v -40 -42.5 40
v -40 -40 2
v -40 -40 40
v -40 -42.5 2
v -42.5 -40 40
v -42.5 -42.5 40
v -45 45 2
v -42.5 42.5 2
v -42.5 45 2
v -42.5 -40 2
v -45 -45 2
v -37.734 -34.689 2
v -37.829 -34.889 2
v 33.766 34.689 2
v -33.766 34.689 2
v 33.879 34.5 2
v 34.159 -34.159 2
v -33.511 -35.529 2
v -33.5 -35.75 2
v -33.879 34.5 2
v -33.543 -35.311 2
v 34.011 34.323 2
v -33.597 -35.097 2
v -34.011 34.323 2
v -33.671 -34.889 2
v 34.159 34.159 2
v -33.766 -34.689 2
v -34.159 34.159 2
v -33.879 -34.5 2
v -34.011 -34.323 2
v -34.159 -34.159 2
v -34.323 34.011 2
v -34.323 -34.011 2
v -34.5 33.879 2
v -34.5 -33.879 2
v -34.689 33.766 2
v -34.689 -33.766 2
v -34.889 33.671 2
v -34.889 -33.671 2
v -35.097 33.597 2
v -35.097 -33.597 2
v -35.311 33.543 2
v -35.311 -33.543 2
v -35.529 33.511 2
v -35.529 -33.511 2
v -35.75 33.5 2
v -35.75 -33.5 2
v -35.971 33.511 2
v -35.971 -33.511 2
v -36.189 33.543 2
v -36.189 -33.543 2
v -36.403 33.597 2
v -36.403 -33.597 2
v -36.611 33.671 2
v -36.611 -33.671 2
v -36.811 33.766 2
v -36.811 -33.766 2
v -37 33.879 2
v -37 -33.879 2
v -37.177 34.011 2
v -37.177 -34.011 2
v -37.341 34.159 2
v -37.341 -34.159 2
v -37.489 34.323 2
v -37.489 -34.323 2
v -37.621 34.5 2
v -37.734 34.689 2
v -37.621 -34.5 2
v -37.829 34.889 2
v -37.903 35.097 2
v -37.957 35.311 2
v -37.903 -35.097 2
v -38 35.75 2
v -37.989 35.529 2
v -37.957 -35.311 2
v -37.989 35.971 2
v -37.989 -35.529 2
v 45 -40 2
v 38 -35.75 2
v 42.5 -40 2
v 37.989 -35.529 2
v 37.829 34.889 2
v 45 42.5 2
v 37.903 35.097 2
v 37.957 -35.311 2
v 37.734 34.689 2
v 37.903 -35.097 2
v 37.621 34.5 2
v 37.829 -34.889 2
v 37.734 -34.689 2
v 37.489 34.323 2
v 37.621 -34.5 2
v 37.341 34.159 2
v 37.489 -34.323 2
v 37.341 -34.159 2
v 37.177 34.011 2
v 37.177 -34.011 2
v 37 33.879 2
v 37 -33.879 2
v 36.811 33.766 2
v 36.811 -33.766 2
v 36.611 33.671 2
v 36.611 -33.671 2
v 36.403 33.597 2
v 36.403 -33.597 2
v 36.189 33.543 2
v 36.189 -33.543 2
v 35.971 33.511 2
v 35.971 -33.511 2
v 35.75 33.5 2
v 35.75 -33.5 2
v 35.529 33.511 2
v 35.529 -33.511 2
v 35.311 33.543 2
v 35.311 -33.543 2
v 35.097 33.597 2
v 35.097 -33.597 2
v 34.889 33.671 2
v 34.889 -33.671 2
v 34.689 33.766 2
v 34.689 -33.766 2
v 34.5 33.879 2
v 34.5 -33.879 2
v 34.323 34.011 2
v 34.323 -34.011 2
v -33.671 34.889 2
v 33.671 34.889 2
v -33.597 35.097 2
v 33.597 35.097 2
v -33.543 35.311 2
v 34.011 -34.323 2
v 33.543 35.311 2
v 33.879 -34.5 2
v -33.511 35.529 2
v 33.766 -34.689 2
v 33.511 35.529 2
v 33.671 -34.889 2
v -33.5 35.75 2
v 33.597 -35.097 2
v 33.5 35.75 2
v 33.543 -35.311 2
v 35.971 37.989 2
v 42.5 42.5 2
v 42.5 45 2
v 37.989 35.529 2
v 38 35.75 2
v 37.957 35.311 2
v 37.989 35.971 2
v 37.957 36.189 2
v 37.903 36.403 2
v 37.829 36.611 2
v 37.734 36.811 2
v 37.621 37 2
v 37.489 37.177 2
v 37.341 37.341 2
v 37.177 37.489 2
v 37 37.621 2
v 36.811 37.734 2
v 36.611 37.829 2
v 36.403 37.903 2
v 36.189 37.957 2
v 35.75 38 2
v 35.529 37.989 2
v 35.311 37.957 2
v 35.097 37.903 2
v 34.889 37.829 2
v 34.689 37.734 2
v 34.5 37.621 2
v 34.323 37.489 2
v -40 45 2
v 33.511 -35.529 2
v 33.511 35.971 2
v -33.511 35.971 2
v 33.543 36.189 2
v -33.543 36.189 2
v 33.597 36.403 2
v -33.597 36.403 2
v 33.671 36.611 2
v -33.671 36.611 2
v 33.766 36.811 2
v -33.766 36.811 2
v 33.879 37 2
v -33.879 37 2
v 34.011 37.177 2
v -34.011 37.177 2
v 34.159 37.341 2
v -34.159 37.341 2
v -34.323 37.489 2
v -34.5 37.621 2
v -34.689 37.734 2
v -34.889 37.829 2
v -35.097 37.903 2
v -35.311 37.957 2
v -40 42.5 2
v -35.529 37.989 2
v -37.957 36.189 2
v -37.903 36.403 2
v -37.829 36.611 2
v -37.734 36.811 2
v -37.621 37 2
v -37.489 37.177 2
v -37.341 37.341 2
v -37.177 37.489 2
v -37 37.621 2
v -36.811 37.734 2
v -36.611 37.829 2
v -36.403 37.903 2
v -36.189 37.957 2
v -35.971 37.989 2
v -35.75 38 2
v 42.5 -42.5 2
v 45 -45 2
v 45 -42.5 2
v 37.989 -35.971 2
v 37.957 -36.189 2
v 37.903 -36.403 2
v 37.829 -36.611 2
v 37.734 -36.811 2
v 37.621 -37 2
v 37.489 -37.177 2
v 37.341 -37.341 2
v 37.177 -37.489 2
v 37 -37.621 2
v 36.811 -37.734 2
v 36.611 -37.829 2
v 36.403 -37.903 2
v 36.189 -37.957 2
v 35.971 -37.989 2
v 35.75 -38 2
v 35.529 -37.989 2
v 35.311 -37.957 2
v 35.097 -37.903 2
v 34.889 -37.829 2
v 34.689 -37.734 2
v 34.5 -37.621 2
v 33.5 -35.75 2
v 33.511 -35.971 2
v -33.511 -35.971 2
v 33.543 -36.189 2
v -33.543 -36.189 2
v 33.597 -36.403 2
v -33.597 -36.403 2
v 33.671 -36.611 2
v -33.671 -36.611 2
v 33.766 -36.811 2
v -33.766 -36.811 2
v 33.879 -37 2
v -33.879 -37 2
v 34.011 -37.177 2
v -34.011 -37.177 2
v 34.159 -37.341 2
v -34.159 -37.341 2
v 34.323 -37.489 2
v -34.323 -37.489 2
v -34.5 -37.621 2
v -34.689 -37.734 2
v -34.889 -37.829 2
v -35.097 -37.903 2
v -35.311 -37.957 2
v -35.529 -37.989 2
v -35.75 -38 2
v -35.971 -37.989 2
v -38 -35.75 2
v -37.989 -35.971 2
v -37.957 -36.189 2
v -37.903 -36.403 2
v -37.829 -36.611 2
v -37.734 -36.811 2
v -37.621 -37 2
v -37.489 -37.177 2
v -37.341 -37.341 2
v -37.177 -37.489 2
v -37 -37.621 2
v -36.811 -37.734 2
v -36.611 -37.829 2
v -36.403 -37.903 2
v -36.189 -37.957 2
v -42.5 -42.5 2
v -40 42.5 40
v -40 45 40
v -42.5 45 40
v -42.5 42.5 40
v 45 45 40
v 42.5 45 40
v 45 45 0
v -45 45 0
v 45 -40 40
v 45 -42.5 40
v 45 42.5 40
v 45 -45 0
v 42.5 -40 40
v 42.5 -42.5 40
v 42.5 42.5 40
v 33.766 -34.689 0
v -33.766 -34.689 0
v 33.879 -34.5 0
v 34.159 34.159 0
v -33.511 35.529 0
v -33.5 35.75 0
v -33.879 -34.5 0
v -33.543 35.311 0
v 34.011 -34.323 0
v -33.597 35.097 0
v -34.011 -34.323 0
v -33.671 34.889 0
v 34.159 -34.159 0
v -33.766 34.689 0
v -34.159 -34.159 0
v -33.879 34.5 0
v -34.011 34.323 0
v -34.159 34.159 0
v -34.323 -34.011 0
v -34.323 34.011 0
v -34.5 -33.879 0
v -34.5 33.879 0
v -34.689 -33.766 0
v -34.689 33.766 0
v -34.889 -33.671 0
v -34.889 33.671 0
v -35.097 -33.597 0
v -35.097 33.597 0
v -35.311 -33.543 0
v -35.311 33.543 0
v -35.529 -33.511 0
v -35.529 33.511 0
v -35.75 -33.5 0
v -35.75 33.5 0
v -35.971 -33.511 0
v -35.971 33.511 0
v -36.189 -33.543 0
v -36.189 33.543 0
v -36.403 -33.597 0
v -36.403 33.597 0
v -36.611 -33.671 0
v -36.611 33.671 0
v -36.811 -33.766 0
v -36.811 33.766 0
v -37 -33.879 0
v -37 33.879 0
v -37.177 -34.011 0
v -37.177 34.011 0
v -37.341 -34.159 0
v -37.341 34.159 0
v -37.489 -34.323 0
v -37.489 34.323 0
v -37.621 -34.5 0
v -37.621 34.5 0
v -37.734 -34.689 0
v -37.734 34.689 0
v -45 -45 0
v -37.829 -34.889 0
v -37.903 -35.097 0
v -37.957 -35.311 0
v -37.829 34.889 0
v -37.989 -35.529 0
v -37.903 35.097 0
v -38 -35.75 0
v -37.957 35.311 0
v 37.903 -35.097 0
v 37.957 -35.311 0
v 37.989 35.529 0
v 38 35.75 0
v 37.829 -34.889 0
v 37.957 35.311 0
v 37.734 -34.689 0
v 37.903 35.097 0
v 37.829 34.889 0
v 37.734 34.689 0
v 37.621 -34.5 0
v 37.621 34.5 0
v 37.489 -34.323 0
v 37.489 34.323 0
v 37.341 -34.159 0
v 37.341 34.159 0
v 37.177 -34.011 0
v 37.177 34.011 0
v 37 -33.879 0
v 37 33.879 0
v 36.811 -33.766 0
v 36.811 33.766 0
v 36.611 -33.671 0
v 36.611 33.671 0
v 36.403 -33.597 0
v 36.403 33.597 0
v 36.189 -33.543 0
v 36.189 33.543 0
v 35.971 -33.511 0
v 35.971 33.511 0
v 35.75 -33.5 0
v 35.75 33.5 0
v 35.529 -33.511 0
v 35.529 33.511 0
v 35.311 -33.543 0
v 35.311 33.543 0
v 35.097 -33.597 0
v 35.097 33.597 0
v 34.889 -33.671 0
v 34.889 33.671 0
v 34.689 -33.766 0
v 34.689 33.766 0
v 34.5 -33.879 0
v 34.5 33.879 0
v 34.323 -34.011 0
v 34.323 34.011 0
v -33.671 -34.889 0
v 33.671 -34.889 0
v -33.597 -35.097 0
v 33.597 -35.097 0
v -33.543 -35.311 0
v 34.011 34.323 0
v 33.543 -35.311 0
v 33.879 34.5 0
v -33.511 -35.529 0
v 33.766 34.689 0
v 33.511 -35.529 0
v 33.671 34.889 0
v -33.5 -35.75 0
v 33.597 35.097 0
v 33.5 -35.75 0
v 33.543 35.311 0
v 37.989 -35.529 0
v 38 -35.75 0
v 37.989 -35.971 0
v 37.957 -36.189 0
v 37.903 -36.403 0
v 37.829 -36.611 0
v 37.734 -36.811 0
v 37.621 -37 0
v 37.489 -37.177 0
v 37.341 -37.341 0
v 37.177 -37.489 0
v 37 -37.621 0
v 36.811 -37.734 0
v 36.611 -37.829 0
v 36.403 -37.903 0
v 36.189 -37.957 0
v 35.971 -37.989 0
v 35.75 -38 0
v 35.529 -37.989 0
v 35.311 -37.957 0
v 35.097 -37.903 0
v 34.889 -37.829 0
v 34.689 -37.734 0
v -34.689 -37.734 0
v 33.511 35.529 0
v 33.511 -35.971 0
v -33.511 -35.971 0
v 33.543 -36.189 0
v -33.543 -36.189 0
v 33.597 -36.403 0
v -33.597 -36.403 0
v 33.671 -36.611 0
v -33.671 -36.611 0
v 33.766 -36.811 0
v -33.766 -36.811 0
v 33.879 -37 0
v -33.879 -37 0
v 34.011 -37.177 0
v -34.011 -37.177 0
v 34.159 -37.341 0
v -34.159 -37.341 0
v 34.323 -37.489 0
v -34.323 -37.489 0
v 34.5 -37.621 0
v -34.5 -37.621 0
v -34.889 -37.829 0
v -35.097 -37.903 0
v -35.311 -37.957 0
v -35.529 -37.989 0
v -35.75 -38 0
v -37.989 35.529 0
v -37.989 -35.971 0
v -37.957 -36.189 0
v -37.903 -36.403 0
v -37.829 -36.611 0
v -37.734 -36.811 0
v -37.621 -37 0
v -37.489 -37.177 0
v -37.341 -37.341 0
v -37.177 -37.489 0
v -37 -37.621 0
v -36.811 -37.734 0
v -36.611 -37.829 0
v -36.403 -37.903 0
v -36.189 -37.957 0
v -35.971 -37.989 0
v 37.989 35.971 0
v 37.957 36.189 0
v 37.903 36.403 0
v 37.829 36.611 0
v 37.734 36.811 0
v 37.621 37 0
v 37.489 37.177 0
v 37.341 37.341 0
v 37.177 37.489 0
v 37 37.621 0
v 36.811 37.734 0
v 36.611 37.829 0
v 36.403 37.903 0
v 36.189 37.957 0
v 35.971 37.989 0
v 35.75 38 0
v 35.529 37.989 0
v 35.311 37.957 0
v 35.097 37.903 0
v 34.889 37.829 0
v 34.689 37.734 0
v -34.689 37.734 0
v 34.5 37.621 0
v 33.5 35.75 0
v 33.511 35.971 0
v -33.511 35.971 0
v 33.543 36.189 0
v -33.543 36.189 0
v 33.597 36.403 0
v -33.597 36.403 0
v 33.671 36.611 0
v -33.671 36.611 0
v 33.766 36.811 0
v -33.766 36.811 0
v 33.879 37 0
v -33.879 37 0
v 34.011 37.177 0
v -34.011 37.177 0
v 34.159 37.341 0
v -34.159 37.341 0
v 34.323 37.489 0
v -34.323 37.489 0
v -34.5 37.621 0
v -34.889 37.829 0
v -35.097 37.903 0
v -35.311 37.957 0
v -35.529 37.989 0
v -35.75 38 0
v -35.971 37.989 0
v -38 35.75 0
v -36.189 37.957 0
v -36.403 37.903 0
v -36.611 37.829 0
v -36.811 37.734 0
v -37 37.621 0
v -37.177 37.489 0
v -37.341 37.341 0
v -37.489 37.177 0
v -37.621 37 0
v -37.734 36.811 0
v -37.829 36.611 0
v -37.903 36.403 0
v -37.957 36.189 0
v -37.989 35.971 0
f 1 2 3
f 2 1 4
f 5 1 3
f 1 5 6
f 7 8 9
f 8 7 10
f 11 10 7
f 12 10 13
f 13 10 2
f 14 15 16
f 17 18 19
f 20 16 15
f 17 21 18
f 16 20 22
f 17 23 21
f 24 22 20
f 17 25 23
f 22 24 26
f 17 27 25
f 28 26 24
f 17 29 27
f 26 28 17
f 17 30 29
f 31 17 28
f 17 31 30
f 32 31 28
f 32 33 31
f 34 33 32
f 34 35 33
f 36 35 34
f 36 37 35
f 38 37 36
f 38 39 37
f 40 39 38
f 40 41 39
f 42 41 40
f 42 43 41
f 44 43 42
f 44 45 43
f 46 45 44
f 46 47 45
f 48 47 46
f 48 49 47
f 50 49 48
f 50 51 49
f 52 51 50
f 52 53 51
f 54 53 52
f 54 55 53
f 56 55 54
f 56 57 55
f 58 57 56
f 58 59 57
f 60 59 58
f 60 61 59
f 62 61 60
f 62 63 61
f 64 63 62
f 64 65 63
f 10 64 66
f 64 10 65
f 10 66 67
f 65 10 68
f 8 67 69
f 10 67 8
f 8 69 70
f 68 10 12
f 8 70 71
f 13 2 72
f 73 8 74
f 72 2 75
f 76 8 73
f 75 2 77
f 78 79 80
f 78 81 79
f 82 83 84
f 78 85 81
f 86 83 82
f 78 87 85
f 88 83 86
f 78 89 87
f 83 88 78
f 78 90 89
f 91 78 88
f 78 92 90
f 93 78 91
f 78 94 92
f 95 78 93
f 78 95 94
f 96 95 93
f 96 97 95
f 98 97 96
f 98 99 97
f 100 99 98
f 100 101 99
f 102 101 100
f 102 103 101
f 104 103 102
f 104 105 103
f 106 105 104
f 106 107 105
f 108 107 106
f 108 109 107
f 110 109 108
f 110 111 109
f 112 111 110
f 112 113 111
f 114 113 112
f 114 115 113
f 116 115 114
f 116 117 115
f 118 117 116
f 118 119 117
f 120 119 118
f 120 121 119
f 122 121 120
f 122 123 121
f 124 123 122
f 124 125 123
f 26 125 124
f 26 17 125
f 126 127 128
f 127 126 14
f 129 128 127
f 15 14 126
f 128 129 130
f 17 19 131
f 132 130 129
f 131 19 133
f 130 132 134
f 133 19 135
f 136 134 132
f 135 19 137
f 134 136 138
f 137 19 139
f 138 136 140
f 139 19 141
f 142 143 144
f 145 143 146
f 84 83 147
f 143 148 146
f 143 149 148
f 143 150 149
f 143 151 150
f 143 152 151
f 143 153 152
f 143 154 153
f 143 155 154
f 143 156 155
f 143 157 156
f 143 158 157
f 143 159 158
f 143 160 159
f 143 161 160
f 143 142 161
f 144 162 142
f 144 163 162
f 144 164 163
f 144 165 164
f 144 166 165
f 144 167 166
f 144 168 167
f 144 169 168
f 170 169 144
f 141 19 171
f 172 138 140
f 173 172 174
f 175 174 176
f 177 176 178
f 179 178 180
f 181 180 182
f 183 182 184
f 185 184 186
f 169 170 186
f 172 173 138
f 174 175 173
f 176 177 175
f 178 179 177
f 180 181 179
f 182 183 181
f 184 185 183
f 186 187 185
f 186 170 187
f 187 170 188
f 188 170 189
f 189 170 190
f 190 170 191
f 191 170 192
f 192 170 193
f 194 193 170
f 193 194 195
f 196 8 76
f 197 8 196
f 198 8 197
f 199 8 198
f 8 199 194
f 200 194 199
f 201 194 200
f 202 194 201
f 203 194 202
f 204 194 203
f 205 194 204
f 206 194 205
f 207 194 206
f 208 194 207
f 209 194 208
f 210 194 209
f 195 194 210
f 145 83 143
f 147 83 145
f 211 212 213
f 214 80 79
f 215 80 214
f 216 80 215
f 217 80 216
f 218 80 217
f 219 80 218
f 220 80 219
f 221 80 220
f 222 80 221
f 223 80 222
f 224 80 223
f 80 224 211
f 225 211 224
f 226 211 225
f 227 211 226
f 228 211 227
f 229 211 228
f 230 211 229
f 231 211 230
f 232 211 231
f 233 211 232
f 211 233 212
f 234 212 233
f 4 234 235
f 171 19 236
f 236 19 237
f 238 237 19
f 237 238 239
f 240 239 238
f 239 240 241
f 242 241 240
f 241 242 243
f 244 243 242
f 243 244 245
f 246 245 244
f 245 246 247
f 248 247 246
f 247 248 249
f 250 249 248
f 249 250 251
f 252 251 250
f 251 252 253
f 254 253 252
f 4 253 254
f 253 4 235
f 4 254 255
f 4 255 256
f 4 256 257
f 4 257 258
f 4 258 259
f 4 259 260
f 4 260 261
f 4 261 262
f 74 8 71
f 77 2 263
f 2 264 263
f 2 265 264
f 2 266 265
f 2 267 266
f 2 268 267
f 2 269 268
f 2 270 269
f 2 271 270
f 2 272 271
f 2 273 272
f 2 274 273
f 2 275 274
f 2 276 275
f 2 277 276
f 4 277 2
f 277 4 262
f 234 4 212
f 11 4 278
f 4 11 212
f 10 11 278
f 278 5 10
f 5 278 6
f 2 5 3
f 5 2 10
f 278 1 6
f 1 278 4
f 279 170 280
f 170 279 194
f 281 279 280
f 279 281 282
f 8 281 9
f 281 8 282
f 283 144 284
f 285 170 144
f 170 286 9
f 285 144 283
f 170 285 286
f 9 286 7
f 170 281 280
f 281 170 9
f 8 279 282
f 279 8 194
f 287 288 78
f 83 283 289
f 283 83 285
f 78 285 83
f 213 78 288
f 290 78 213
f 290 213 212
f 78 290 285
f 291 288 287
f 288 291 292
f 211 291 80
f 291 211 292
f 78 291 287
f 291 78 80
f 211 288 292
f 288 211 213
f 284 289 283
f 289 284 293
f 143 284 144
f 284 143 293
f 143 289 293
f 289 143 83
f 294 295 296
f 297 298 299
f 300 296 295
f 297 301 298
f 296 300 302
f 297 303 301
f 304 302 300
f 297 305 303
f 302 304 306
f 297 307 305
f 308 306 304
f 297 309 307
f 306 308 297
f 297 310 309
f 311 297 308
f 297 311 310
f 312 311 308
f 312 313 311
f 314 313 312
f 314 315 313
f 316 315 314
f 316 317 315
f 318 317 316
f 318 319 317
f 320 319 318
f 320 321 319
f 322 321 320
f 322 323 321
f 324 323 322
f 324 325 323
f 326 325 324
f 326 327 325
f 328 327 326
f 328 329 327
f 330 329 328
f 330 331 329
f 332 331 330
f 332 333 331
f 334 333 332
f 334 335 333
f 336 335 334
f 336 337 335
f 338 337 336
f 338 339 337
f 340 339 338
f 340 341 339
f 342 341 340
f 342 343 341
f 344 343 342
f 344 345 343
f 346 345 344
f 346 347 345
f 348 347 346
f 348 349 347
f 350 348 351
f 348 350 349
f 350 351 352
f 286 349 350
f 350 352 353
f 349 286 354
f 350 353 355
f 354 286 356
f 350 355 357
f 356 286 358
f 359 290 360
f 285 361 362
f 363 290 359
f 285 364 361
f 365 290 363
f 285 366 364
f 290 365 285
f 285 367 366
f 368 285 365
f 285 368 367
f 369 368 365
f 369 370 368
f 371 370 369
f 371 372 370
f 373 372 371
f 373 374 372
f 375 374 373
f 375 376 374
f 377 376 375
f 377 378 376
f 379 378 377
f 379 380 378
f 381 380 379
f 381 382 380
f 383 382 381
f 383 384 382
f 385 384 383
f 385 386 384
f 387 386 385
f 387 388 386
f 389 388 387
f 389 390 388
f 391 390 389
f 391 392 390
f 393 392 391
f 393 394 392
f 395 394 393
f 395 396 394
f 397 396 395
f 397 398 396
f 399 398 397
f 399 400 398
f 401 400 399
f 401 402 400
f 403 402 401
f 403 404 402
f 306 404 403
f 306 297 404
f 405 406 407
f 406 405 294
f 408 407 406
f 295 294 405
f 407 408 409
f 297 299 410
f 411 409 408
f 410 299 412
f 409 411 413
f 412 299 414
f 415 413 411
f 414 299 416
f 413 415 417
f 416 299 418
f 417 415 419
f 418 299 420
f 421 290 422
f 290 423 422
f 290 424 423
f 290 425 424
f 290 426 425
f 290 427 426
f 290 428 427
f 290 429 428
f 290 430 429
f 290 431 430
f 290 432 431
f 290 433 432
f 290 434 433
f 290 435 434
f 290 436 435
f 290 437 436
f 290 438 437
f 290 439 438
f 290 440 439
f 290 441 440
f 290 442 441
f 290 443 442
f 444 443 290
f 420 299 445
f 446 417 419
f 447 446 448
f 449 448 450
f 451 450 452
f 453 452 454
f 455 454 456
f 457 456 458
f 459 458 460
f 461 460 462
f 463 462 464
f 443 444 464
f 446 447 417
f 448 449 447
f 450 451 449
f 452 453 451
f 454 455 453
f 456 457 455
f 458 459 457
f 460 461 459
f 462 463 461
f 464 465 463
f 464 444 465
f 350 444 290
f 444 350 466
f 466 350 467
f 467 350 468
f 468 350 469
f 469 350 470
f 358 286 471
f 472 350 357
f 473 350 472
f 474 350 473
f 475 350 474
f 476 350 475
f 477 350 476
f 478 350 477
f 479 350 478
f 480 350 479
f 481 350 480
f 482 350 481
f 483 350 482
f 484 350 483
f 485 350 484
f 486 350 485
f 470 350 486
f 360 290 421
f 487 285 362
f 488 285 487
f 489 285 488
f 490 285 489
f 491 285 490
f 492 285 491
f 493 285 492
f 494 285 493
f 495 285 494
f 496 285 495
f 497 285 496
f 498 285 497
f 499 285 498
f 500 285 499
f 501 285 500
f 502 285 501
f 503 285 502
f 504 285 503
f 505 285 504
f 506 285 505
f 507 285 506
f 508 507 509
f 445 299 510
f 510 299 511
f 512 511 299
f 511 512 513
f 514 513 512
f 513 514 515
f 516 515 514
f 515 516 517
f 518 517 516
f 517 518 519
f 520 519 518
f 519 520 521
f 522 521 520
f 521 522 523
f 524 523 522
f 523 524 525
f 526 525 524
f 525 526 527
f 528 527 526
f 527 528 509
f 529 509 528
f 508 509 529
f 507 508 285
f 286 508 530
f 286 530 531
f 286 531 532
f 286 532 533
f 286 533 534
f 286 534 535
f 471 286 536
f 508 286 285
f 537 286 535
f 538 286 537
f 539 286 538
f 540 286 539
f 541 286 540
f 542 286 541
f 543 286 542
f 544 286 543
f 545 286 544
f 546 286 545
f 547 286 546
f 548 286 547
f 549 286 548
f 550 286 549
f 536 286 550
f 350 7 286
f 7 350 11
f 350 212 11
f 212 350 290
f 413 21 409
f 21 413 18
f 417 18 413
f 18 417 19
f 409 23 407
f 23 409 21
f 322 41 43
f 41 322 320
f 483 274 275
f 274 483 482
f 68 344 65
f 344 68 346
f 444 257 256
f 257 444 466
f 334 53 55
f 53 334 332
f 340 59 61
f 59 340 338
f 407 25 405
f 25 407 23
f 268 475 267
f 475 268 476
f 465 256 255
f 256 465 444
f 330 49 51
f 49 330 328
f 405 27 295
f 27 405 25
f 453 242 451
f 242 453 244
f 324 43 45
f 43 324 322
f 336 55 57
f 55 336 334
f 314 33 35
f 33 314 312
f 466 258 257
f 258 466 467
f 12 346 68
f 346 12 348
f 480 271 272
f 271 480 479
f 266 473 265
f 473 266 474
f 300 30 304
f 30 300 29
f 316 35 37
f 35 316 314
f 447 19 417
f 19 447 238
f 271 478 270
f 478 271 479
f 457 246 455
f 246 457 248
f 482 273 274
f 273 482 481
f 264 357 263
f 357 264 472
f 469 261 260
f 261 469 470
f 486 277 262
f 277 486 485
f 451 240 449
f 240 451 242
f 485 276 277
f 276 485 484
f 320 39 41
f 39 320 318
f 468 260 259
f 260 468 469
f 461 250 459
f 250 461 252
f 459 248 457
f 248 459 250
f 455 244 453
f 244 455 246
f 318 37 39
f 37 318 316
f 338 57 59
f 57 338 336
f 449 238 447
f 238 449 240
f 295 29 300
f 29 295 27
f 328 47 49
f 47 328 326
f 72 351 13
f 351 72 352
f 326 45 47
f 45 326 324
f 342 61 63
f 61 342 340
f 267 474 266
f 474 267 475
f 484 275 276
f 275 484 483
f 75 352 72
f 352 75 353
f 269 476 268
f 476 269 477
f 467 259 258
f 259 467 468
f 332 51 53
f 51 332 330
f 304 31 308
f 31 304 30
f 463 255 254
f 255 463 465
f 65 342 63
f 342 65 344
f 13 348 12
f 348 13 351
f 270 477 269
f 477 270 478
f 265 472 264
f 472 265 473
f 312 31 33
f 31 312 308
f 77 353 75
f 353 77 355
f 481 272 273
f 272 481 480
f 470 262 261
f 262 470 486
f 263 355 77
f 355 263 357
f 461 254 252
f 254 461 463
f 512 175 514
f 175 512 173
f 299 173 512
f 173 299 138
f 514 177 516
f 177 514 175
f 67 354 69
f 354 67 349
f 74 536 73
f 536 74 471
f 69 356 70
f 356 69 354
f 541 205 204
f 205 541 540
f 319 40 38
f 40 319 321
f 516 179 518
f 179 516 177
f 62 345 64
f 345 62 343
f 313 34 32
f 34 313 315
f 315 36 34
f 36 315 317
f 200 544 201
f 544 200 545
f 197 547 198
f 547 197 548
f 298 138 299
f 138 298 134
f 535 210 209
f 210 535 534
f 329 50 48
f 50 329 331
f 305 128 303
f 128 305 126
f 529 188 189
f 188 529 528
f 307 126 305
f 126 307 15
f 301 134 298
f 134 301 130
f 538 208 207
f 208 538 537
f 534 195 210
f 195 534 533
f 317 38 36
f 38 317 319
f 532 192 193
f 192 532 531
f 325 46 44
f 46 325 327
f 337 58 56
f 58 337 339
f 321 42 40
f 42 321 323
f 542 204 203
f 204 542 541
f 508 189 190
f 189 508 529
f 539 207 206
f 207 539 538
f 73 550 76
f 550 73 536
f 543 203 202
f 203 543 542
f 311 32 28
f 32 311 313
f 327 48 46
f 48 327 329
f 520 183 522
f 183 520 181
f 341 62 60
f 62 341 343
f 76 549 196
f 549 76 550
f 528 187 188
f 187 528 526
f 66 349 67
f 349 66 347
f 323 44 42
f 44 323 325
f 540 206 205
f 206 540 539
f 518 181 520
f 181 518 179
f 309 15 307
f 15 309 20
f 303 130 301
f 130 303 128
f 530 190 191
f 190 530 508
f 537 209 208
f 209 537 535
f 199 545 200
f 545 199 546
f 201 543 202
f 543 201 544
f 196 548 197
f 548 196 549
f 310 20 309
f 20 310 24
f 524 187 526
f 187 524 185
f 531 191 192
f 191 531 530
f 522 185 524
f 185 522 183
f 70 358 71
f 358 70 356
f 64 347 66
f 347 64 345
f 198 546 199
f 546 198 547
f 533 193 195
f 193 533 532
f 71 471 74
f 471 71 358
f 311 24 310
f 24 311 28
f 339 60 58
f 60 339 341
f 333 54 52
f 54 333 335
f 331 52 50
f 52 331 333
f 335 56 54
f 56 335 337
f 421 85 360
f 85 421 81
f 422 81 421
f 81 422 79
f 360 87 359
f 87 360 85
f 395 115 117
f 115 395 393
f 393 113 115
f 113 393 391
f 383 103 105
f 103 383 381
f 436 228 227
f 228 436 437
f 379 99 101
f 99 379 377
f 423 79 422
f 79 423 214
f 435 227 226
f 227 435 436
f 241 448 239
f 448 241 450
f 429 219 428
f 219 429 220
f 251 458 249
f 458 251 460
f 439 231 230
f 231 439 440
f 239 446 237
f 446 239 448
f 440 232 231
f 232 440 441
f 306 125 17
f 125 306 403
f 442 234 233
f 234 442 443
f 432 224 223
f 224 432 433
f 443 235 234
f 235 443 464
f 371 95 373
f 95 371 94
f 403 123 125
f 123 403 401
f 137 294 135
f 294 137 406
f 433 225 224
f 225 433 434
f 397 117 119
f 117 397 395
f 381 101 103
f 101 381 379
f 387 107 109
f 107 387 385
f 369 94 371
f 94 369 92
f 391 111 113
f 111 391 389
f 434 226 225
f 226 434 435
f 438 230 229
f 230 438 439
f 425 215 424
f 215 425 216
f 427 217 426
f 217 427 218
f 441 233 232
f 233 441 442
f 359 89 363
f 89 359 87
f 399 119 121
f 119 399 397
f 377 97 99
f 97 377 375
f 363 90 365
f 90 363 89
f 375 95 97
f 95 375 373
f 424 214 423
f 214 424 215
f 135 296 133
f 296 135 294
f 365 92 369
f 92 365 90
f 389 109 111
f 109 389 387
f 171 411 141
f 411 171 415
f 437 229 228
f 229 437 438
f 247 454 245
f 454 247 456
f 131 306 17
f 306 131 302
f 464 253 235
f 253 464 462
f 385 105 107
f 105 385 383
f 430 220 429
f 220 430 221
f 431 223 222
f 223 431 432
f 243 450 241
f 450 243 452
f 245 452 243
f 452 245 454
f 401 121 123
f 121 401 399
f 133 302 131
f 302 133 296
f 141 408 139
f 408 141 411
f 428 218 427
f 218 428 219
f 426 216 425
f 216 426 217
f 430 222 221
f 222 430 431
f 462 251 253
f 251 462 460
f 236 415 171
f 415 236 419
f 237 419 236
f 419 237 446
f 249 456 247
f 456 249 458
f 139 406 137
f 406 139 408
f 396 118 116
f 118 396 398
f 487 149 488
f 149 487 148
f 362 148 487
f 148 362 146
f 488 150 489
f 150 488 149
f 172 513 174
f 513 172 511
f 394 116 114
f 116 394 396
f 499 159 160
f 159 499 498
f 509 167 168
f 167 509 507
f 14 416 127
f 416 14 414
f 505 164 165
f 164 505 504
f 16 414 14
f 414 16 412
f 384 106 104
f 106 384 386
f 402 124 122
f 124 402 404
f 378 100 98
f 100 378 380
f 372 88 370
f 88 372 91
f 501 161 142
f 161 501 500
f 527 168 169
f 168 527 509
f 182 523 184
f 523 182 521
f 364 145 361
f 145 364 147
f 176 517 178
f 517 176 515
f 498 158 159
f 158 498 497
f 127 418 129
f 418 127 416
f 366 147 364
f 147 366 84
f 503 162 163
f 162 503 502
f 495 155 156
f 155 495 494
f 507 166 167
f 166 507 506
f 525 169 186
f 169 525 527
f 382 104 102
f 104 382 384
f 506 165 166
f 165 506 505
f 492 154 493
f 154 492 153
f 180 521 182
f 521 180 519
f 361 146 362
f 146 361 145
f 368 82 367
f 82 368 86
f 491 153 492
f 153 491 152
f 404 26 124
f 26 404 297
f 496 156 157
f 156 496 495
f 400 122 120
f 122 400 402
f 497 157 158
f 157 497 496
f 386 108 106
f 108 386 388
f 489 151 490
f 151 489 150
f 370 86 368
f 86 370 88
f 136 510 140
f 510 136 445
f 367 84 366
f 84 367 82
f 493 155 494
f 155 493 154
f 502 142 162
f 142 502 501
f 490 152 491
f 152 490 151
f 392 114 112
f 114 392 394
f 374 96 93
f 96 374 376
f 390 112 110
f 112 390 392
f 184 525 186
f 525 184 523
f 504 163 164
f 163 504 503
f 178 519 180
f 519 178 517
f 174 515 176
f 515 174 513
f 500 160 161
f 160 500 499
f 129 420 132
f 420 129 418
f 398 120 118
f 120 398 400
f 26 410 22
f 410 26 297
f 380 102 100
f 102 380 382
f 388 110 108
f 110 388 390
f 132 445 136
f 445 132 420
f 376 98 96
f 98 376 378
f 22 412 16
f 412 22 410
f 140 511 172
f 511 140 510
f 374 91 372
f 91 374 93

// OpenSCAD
// DIY magnetic stirrer housing for 80 mm PC case fan
// Print orientation: top plate on bed (z = 0), walls build upward (+Z)
// Note: this is the upside-down open box used in practice

// ---------- Dimensions (mm) ----------
outer_size     = 90;    // outer size of box (X and Y)
top_plate_t    = 2;     // top plate thickness (z = 0 to 2)
wall_t         = 2.5;   // wall thickness (z = 2 to 40)
open_top_z     = 40;    // height of open top edge
hole_d         = 4.5;   // M4 screw hole diameter
hole_pattern   = 71.5;  // square pitch of screw holes (X and Y)
notch_w        = 12;    // power cable notch width
notch_depth    = 8;     // notch depth from open edge (z = 32 to 40)
eps            = 0.5;   // cutter overshoot past faces

$fn = 64;

// ---------- Model ----------
difference() {
    union() {
        // Top plate (lies on the bed)
        translate([-outer_size/2, -outer_size/2, 0])
            cube([outer_size, outer_size, top_plate_t]);

        // Four walls rising from the plate
        for (sx = [-1, 1], sy = [-1, 1])
            translate([sx * (outer_size/2 - wall_t),
                       sy * (outer_size/2 - wall_t),
                       top_plate_t])
                cube([wall_t, wall_t, open_top_z - top_plate_t]);
    }

    // Screw holes through the top plate on a 71.5 mm square pattern
    for (x = [-hole_pattern/2, hole_pattern/2])
        for (y = [-hole_pattern/2, hole_pattern/2])
            translate([x, y, -eps])
                cylinder(d = hole_d, h = top_plate_t + 2*eps);

    // Power cable notch cut into one wall (from open edge down to z = 32)
    translate([-notch_w/2, 0, open_top_z - notch_depth])
        cube([notch_w, wall_t + eps, notch_depth + eps]);
}
